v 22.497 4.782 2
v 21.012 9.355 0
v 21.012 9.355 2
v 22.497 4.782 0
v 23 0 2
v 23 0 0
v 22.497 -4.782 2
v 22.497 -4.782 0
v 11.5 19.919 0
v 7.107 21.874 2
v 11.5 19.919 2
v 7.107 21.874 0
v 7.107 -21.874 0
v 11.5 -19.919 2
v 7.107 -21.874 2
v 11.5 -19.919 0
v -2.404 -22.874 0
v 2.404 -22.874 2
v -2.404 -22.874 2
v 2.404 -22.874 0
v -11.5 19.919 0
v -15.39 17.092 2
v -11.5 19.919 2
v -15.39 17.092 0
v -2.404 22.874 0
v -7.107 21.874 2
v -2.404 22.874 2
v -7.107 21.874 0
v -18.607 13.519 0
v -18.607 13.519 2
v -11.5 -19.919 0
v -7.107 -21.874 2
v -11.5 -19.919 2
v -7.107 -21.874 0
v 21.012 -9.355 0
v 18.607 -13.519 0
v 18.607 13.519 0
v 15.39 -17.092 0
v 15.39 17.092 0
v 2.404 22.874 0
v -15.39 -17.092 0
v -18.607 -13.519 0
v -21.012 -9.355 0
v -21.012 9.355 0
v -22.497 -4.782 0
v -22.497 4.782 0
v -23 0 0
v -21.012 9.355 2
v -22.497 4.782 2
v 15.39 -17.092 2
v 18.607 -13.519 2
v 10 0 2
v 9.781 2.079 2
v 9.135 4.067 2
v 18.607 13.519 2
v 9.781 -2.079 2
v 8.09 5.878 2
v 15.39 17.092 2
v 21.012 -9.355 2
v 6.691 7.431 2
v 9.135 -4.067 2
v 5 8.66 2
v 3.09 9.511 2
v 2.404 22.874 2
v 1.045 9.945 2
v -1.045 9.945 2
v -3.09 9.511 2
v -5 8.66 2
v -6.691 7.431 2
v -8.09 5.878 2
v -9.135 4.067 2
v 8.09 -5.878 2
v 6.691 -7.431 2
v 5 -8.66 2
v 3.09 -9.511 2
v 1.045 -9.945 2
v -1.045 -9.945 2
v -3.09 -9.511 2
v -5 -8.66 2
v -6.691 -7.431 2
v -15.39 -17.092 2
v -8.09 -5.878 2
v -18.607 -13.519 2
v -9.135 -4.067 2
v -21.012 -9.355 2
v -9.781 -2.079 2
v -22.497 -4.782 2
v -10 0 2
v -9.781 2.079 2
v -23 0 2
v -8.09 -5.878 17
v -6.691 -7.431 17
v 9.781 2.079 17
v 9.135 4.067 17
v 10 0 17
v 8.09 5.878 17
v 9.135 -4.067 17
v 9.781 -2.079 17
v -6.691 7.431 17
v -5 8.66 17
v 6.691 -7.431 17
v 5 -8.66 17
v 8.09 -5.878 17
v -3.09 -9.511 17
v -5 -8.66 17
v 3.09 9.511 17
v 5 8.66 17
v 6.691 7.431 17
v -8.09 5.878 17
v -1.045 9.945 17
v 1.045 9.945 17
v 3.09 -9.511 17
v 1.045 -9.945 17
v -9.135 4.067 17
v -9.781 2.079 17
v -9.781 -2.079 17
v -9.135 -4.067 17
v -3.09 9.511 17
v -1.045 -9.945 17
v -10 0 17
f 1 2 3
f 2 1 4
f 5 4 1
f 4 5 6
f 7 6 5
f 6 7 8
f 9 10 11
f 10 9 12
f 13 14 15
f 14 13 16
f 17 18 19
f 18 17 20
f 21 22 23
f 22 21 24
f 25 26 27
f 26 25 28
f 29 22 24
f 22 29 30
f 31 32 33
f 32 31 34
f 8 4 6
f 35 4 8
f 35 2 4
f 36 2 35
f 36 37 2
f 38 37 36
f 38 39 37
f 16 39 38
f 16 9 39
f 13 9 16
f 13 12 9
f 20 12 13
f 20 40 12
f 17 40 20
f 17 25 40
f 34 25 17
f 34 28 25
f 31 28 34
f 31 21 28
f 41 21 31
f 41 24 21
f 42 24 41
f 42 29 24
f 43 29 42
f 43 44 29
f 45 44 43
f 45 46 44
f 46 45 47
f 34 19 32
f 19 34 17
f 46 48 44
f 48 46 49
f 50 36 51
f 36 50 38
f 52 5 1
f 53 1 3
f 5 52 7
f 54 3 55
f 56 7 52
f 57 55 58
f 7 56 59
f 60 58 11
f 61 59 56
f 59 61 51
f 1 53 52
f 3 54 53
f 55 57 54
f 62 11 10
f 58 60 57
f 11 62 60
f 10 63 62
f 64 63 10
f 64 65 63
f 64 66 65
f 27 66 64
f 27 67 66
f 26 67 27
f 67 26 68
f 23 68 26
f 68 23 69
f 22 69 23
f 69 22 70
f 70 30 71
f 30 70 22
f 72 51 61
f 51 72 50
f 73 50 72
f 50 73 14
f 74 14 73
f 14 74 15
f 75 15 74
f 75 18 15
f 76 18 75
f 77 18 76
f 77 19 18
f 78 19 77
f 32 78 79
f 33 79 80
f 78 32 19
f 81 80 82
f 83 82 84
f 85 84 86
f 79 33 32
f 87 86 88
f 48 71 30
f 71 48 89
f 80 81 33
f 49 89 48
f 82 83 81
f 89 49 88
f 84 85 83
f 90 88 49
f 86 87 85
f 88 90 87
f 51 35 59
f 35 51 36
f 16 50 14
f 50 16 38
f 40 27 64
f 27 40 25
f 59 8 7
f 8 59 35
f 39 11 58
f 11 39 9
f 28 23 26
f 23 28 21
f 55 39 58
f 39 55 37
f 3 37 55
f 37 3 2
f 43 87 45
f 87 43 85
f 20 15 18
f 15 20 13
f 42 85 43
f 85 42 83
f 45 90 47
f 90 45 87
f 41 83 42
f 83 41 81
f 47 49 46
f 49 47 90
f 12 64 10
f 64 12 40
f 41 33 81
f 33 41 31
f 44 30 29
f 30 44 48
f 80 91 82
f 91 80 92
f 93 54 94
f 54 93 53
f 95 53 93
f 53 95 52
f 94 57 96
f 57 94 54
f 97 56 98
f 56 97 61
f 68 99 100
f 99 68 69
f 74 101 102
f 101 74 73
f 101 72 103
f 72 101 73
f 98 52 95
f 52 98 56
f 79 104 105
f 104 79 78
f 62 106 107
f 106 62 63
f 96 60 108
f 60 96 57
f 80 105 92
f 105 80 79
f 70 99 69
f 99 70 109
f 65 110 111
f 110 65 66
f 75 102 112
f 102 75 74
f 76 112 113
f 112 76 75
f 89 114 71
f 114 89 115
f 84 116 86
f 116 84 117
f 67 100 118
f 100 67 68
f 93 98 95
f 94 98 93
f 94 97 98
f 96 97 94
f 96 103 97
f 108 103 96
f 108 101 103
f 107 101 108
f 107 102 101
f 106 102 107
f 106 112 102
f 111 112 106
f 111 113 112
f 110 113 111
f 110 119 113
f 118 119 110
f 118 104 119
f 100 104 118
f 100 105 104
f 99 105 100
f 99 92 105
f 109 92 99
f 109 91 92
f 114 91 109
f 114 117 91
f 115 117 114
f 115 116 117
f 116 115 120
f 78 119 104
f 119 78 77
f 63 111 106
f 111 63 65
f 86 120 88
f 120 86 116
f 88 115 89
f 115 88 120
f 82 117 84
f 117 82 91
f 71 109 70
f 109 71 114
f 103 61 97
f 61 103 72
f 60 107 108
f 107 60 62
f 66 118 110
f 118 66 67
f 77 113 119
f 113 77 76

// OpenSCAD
spool_diameter = 46;
spool_radius = spool_diameter/2;
template_height = 2;
handle_radius = 10;
handle_height = 15;

cylinder(template_height, spool_radius, spool_radius);
cylinder(template_height + handle_height, handle_radius, handle_radius);   
